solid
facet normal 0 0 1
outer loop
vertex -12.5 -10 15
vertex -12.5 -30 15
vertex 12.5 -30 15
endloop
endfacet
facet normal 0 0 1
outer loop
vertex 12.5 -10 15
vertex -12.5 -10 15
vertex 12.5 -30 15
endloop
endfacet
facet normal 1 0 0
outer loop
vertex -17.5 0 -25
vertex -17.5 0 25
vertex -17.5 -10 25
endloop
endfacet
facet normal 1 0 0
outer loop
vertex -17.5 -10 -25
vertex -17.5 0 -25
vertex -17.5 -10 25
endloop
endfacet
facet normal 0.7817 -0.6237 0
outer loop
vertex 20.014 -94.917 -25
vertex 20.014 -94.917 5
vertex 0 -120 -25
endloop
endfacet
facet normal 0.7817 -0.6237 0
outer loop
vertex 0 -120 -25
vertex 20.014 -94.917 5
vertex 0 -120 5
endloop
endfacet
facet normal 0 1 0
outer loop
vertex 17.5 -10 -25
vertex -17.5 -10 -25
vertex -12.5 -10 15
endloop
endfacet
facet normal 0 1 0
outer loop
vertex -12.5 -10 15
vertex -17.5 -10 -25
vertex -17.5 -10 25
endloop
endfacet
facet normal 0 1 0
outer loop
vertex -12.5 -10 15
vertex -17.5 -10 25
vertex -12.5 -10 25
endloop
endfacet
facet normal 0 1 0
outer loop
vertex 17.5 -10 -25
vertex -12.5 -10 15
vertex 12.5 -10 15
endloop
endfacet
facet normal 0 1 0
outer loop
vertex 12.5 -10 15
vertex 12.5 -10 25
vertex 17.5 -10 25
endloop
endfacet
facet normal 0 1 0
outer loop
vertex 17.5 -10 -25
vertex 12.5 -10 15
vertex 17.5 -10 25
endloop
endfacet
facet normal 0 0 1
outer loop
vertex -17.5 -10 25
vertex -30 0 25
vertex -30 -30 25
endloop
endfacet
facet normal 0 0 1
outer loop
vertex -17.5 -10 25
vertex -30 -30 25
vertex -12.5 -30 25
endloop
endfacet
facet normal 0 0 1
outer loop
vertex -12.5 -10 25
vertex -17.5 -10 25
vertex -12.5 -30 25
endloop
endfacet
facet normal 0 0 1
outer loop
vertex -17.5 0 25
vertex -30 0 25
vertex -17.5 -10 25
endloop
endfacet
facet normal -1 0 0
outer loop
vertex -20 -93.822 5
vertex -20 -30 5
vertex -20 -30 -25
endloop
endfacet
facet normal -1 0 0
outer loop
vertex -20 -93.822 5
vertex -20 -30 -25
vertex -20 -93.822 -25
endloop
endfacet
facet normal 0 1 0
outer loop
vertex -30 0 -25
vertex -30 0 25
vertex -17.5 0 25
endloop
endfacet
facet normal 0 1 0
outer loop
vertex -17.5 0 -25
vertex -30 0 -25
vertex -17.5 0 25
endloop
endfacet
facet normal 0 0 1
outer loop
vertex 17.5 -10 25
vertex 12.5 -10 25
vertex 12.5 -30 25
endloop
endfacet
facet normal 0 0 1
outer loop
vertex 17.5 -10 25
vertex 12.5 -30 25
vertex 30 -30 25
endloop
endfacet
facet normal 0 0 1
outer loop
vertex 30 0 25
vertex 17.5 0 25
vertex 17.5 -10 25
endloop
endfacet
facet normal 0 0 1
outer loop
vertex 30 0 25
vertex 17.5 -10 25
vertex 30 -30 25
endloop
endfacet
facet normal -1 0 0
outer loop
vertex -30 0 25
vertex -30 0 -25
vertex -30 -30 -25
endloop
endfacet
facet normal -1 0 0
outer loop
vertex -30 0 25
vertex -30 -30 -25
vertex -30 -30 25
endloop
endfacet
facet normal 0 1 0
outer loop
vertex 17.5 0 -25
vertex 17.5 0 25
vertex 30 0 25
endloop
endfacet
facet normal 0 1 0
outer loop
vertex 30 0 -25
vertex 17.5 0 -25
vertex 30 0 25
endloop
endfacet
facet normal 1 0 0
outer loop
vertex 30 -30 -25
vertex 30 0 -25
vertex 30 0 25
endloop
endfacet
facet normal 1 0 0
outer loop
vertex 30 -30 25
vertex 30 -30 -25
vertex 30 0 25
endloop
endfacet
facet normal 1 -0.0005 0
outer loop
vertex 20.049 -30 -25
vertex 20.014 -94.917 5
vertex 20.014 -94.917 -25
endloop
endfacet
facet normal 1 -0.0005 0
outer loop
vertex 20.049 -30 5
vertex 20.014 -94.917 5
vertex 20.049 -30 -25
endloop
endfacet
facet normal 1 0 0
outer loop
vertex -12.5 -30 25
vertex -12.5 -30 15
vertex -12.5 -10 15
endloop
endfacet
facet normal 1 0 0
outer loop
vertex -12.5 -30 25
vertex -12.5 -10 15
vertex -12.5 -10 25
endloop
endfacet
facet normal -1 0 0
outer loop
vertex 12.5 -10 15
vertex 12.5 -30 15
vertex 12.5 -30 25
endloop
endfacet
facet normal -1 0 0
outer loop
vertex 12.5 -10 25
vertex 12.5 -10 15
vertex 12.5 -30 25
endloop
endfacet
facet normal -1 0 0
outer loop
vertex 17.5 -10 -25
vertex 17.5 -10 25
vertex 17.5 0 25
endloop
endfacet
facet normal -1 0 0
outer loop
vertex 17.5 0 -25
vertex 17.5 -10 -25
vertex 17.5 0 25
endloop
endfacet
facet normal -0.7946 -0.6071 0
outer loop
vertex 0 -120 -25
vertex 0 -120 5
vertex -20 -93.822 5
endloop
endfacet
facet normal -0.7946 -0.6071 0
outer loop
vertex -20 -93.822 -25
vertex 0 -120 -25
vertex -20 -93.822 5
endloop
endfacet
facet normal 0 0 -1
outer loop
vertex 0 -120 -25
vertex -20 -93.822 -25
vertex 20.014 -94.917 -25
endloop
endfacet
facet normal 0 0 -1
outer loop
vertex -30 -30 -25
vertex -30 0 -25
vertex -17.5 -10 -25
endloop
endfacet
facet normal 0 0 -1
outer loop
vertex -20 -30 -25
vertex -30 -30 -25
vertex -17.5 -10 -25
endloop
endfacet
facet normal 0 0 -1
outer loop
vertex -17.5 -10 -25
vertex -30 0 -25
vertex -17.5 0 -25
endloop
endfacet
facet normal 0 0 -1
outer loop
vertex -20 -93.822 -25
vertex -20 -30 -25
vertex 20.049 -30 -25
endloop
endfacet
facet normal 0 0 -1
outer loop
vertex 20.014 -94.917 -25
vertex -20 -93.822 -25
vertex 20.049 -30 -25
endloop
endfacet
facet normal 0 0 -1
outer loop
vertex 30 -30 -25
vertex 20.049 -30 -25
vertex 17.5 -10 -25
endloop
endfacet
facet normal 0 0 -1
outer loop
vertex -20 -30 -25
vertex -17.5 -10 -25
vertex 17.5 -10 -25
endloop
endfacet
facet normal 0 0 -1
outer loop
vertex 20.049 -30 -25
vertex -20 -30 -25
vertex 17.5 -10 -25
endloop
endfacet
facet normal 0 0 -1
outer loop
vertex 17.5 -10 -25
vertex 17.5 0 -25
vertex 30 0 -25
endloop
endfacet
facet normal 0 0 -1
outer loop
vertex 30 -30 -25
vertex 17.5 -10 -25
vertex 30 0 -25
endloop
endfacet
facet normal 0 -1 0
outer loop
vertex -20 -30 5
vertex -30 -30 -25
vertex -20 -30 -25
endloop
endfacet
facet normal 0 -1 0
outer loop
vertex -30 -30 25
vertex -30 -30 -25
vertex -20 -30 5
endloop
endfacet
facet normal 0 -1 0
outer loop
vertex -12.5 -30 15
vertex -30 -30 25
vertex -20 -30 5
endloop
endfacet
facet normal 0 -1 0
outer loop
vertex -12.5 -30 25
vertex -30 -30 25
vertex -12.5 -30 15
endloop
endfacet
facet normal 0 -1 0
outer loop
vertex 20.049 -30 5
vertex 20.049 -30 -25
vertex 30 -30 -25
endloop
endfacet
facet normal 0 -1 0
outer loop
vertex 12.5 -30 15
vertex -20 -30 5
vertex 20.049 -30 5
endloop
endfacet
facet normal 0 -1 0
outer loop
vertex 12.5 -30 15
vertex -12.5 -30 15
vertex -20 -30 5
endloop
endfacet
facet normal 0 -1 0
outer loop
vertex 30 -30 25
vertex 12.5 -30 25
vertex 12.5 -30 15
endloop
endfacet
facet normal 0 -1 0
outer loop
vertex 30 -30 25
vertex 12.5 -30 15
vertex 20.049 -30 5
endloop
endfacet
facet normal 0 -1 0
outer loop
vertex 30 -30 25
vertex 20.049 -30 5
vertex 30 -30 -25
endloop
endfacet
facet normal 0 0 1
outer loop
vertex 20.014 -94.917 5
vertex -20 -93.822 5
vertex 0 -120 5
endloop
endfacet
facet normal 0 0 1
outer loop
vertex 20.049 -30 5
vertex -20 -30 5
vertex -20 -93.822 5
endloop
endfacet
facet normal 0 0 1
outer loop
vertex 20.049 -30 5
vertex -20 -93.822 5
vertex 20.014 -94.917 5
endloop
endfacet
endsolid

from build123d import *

# Parameters (mm, degrees)
F0_W      = 60
F0_H      = 50
F1_DEPTH  = 30
F2_W      = 25
F2_H      = 10
F3_DEPTH  = 30.001
F5_DEPTH  = 40.001
F6_DEPTH  = 10.001
F9_DEPTH  = 30
F11_DEPTH = 30.001


with BuildPart() as f1:
    # F0 (on Front) → F1 (new body)
    with BuildSketch(Plane.XZ):
        Rectangle(F0_W, F0_H)
    extrude(amount=F1_DEPTH)

    # F2 (on face) → F3 (cut, through all)
    with BuildSketch(Plane.XZ.offset(30)):
        with Locations((0, 20)):
            Rectangle(F2_W, F2_H)
    extrude(amount=-F3_DEPTH, mode=Mode.SUBTRACT)

    # F4 (on face) → F5 (cut, through all)
    with BuildSketch(Plane.XY.offset(15)):
        Polygon((-17.5, -10), (-12.5, -10), (17.5, -10), (17.5, 0), (-17.5, 0), align=None)
    extrude(amount=-F5_DEPTH, mode=Mode.SUBTRACT)

    # F6 (cut, through all): faces of the model
    f6_faces = [f1.faces().sort_by_distance(p)[0] for p in [
        (15, -5, 15),
        (-15, -5, 15),
    ]]
    extrude(f6_faces, amount=-F6_DEPTH, mode=Mode.SUBTRACT)

    # F8 (on offset) → F9 (join)
    with BuildSketch(Plane.XY.offset(5)):
        Polygon((20.0490429997, -29.9998670816), (-20.0000924617, -29.9999825656), (-20.0000924617, -119.9999825656), (19.9999075383, -119.9999825656), align=None)
    extrude(amount=-F9_DEPTH)

    # F10 (on face) → F11 (cut, through all)
    with BuildSketch(Plane.XY.offset(5)):
        Polygon((20.0136015809, -94.9169696898), (-9.24617e-05, -119.9999825656), (19.9999075383, -119.9999825656), align=None)
        Polygon((-9.24617e-05, -119.9999825656), (-20.0000924617, -93.8219279051), (-20.0000924617, -119.9999825656), align=None)
    extrude(amount=-F11_DEPTH, mode=Mode.SUBTRACT)


solid = f1.part
